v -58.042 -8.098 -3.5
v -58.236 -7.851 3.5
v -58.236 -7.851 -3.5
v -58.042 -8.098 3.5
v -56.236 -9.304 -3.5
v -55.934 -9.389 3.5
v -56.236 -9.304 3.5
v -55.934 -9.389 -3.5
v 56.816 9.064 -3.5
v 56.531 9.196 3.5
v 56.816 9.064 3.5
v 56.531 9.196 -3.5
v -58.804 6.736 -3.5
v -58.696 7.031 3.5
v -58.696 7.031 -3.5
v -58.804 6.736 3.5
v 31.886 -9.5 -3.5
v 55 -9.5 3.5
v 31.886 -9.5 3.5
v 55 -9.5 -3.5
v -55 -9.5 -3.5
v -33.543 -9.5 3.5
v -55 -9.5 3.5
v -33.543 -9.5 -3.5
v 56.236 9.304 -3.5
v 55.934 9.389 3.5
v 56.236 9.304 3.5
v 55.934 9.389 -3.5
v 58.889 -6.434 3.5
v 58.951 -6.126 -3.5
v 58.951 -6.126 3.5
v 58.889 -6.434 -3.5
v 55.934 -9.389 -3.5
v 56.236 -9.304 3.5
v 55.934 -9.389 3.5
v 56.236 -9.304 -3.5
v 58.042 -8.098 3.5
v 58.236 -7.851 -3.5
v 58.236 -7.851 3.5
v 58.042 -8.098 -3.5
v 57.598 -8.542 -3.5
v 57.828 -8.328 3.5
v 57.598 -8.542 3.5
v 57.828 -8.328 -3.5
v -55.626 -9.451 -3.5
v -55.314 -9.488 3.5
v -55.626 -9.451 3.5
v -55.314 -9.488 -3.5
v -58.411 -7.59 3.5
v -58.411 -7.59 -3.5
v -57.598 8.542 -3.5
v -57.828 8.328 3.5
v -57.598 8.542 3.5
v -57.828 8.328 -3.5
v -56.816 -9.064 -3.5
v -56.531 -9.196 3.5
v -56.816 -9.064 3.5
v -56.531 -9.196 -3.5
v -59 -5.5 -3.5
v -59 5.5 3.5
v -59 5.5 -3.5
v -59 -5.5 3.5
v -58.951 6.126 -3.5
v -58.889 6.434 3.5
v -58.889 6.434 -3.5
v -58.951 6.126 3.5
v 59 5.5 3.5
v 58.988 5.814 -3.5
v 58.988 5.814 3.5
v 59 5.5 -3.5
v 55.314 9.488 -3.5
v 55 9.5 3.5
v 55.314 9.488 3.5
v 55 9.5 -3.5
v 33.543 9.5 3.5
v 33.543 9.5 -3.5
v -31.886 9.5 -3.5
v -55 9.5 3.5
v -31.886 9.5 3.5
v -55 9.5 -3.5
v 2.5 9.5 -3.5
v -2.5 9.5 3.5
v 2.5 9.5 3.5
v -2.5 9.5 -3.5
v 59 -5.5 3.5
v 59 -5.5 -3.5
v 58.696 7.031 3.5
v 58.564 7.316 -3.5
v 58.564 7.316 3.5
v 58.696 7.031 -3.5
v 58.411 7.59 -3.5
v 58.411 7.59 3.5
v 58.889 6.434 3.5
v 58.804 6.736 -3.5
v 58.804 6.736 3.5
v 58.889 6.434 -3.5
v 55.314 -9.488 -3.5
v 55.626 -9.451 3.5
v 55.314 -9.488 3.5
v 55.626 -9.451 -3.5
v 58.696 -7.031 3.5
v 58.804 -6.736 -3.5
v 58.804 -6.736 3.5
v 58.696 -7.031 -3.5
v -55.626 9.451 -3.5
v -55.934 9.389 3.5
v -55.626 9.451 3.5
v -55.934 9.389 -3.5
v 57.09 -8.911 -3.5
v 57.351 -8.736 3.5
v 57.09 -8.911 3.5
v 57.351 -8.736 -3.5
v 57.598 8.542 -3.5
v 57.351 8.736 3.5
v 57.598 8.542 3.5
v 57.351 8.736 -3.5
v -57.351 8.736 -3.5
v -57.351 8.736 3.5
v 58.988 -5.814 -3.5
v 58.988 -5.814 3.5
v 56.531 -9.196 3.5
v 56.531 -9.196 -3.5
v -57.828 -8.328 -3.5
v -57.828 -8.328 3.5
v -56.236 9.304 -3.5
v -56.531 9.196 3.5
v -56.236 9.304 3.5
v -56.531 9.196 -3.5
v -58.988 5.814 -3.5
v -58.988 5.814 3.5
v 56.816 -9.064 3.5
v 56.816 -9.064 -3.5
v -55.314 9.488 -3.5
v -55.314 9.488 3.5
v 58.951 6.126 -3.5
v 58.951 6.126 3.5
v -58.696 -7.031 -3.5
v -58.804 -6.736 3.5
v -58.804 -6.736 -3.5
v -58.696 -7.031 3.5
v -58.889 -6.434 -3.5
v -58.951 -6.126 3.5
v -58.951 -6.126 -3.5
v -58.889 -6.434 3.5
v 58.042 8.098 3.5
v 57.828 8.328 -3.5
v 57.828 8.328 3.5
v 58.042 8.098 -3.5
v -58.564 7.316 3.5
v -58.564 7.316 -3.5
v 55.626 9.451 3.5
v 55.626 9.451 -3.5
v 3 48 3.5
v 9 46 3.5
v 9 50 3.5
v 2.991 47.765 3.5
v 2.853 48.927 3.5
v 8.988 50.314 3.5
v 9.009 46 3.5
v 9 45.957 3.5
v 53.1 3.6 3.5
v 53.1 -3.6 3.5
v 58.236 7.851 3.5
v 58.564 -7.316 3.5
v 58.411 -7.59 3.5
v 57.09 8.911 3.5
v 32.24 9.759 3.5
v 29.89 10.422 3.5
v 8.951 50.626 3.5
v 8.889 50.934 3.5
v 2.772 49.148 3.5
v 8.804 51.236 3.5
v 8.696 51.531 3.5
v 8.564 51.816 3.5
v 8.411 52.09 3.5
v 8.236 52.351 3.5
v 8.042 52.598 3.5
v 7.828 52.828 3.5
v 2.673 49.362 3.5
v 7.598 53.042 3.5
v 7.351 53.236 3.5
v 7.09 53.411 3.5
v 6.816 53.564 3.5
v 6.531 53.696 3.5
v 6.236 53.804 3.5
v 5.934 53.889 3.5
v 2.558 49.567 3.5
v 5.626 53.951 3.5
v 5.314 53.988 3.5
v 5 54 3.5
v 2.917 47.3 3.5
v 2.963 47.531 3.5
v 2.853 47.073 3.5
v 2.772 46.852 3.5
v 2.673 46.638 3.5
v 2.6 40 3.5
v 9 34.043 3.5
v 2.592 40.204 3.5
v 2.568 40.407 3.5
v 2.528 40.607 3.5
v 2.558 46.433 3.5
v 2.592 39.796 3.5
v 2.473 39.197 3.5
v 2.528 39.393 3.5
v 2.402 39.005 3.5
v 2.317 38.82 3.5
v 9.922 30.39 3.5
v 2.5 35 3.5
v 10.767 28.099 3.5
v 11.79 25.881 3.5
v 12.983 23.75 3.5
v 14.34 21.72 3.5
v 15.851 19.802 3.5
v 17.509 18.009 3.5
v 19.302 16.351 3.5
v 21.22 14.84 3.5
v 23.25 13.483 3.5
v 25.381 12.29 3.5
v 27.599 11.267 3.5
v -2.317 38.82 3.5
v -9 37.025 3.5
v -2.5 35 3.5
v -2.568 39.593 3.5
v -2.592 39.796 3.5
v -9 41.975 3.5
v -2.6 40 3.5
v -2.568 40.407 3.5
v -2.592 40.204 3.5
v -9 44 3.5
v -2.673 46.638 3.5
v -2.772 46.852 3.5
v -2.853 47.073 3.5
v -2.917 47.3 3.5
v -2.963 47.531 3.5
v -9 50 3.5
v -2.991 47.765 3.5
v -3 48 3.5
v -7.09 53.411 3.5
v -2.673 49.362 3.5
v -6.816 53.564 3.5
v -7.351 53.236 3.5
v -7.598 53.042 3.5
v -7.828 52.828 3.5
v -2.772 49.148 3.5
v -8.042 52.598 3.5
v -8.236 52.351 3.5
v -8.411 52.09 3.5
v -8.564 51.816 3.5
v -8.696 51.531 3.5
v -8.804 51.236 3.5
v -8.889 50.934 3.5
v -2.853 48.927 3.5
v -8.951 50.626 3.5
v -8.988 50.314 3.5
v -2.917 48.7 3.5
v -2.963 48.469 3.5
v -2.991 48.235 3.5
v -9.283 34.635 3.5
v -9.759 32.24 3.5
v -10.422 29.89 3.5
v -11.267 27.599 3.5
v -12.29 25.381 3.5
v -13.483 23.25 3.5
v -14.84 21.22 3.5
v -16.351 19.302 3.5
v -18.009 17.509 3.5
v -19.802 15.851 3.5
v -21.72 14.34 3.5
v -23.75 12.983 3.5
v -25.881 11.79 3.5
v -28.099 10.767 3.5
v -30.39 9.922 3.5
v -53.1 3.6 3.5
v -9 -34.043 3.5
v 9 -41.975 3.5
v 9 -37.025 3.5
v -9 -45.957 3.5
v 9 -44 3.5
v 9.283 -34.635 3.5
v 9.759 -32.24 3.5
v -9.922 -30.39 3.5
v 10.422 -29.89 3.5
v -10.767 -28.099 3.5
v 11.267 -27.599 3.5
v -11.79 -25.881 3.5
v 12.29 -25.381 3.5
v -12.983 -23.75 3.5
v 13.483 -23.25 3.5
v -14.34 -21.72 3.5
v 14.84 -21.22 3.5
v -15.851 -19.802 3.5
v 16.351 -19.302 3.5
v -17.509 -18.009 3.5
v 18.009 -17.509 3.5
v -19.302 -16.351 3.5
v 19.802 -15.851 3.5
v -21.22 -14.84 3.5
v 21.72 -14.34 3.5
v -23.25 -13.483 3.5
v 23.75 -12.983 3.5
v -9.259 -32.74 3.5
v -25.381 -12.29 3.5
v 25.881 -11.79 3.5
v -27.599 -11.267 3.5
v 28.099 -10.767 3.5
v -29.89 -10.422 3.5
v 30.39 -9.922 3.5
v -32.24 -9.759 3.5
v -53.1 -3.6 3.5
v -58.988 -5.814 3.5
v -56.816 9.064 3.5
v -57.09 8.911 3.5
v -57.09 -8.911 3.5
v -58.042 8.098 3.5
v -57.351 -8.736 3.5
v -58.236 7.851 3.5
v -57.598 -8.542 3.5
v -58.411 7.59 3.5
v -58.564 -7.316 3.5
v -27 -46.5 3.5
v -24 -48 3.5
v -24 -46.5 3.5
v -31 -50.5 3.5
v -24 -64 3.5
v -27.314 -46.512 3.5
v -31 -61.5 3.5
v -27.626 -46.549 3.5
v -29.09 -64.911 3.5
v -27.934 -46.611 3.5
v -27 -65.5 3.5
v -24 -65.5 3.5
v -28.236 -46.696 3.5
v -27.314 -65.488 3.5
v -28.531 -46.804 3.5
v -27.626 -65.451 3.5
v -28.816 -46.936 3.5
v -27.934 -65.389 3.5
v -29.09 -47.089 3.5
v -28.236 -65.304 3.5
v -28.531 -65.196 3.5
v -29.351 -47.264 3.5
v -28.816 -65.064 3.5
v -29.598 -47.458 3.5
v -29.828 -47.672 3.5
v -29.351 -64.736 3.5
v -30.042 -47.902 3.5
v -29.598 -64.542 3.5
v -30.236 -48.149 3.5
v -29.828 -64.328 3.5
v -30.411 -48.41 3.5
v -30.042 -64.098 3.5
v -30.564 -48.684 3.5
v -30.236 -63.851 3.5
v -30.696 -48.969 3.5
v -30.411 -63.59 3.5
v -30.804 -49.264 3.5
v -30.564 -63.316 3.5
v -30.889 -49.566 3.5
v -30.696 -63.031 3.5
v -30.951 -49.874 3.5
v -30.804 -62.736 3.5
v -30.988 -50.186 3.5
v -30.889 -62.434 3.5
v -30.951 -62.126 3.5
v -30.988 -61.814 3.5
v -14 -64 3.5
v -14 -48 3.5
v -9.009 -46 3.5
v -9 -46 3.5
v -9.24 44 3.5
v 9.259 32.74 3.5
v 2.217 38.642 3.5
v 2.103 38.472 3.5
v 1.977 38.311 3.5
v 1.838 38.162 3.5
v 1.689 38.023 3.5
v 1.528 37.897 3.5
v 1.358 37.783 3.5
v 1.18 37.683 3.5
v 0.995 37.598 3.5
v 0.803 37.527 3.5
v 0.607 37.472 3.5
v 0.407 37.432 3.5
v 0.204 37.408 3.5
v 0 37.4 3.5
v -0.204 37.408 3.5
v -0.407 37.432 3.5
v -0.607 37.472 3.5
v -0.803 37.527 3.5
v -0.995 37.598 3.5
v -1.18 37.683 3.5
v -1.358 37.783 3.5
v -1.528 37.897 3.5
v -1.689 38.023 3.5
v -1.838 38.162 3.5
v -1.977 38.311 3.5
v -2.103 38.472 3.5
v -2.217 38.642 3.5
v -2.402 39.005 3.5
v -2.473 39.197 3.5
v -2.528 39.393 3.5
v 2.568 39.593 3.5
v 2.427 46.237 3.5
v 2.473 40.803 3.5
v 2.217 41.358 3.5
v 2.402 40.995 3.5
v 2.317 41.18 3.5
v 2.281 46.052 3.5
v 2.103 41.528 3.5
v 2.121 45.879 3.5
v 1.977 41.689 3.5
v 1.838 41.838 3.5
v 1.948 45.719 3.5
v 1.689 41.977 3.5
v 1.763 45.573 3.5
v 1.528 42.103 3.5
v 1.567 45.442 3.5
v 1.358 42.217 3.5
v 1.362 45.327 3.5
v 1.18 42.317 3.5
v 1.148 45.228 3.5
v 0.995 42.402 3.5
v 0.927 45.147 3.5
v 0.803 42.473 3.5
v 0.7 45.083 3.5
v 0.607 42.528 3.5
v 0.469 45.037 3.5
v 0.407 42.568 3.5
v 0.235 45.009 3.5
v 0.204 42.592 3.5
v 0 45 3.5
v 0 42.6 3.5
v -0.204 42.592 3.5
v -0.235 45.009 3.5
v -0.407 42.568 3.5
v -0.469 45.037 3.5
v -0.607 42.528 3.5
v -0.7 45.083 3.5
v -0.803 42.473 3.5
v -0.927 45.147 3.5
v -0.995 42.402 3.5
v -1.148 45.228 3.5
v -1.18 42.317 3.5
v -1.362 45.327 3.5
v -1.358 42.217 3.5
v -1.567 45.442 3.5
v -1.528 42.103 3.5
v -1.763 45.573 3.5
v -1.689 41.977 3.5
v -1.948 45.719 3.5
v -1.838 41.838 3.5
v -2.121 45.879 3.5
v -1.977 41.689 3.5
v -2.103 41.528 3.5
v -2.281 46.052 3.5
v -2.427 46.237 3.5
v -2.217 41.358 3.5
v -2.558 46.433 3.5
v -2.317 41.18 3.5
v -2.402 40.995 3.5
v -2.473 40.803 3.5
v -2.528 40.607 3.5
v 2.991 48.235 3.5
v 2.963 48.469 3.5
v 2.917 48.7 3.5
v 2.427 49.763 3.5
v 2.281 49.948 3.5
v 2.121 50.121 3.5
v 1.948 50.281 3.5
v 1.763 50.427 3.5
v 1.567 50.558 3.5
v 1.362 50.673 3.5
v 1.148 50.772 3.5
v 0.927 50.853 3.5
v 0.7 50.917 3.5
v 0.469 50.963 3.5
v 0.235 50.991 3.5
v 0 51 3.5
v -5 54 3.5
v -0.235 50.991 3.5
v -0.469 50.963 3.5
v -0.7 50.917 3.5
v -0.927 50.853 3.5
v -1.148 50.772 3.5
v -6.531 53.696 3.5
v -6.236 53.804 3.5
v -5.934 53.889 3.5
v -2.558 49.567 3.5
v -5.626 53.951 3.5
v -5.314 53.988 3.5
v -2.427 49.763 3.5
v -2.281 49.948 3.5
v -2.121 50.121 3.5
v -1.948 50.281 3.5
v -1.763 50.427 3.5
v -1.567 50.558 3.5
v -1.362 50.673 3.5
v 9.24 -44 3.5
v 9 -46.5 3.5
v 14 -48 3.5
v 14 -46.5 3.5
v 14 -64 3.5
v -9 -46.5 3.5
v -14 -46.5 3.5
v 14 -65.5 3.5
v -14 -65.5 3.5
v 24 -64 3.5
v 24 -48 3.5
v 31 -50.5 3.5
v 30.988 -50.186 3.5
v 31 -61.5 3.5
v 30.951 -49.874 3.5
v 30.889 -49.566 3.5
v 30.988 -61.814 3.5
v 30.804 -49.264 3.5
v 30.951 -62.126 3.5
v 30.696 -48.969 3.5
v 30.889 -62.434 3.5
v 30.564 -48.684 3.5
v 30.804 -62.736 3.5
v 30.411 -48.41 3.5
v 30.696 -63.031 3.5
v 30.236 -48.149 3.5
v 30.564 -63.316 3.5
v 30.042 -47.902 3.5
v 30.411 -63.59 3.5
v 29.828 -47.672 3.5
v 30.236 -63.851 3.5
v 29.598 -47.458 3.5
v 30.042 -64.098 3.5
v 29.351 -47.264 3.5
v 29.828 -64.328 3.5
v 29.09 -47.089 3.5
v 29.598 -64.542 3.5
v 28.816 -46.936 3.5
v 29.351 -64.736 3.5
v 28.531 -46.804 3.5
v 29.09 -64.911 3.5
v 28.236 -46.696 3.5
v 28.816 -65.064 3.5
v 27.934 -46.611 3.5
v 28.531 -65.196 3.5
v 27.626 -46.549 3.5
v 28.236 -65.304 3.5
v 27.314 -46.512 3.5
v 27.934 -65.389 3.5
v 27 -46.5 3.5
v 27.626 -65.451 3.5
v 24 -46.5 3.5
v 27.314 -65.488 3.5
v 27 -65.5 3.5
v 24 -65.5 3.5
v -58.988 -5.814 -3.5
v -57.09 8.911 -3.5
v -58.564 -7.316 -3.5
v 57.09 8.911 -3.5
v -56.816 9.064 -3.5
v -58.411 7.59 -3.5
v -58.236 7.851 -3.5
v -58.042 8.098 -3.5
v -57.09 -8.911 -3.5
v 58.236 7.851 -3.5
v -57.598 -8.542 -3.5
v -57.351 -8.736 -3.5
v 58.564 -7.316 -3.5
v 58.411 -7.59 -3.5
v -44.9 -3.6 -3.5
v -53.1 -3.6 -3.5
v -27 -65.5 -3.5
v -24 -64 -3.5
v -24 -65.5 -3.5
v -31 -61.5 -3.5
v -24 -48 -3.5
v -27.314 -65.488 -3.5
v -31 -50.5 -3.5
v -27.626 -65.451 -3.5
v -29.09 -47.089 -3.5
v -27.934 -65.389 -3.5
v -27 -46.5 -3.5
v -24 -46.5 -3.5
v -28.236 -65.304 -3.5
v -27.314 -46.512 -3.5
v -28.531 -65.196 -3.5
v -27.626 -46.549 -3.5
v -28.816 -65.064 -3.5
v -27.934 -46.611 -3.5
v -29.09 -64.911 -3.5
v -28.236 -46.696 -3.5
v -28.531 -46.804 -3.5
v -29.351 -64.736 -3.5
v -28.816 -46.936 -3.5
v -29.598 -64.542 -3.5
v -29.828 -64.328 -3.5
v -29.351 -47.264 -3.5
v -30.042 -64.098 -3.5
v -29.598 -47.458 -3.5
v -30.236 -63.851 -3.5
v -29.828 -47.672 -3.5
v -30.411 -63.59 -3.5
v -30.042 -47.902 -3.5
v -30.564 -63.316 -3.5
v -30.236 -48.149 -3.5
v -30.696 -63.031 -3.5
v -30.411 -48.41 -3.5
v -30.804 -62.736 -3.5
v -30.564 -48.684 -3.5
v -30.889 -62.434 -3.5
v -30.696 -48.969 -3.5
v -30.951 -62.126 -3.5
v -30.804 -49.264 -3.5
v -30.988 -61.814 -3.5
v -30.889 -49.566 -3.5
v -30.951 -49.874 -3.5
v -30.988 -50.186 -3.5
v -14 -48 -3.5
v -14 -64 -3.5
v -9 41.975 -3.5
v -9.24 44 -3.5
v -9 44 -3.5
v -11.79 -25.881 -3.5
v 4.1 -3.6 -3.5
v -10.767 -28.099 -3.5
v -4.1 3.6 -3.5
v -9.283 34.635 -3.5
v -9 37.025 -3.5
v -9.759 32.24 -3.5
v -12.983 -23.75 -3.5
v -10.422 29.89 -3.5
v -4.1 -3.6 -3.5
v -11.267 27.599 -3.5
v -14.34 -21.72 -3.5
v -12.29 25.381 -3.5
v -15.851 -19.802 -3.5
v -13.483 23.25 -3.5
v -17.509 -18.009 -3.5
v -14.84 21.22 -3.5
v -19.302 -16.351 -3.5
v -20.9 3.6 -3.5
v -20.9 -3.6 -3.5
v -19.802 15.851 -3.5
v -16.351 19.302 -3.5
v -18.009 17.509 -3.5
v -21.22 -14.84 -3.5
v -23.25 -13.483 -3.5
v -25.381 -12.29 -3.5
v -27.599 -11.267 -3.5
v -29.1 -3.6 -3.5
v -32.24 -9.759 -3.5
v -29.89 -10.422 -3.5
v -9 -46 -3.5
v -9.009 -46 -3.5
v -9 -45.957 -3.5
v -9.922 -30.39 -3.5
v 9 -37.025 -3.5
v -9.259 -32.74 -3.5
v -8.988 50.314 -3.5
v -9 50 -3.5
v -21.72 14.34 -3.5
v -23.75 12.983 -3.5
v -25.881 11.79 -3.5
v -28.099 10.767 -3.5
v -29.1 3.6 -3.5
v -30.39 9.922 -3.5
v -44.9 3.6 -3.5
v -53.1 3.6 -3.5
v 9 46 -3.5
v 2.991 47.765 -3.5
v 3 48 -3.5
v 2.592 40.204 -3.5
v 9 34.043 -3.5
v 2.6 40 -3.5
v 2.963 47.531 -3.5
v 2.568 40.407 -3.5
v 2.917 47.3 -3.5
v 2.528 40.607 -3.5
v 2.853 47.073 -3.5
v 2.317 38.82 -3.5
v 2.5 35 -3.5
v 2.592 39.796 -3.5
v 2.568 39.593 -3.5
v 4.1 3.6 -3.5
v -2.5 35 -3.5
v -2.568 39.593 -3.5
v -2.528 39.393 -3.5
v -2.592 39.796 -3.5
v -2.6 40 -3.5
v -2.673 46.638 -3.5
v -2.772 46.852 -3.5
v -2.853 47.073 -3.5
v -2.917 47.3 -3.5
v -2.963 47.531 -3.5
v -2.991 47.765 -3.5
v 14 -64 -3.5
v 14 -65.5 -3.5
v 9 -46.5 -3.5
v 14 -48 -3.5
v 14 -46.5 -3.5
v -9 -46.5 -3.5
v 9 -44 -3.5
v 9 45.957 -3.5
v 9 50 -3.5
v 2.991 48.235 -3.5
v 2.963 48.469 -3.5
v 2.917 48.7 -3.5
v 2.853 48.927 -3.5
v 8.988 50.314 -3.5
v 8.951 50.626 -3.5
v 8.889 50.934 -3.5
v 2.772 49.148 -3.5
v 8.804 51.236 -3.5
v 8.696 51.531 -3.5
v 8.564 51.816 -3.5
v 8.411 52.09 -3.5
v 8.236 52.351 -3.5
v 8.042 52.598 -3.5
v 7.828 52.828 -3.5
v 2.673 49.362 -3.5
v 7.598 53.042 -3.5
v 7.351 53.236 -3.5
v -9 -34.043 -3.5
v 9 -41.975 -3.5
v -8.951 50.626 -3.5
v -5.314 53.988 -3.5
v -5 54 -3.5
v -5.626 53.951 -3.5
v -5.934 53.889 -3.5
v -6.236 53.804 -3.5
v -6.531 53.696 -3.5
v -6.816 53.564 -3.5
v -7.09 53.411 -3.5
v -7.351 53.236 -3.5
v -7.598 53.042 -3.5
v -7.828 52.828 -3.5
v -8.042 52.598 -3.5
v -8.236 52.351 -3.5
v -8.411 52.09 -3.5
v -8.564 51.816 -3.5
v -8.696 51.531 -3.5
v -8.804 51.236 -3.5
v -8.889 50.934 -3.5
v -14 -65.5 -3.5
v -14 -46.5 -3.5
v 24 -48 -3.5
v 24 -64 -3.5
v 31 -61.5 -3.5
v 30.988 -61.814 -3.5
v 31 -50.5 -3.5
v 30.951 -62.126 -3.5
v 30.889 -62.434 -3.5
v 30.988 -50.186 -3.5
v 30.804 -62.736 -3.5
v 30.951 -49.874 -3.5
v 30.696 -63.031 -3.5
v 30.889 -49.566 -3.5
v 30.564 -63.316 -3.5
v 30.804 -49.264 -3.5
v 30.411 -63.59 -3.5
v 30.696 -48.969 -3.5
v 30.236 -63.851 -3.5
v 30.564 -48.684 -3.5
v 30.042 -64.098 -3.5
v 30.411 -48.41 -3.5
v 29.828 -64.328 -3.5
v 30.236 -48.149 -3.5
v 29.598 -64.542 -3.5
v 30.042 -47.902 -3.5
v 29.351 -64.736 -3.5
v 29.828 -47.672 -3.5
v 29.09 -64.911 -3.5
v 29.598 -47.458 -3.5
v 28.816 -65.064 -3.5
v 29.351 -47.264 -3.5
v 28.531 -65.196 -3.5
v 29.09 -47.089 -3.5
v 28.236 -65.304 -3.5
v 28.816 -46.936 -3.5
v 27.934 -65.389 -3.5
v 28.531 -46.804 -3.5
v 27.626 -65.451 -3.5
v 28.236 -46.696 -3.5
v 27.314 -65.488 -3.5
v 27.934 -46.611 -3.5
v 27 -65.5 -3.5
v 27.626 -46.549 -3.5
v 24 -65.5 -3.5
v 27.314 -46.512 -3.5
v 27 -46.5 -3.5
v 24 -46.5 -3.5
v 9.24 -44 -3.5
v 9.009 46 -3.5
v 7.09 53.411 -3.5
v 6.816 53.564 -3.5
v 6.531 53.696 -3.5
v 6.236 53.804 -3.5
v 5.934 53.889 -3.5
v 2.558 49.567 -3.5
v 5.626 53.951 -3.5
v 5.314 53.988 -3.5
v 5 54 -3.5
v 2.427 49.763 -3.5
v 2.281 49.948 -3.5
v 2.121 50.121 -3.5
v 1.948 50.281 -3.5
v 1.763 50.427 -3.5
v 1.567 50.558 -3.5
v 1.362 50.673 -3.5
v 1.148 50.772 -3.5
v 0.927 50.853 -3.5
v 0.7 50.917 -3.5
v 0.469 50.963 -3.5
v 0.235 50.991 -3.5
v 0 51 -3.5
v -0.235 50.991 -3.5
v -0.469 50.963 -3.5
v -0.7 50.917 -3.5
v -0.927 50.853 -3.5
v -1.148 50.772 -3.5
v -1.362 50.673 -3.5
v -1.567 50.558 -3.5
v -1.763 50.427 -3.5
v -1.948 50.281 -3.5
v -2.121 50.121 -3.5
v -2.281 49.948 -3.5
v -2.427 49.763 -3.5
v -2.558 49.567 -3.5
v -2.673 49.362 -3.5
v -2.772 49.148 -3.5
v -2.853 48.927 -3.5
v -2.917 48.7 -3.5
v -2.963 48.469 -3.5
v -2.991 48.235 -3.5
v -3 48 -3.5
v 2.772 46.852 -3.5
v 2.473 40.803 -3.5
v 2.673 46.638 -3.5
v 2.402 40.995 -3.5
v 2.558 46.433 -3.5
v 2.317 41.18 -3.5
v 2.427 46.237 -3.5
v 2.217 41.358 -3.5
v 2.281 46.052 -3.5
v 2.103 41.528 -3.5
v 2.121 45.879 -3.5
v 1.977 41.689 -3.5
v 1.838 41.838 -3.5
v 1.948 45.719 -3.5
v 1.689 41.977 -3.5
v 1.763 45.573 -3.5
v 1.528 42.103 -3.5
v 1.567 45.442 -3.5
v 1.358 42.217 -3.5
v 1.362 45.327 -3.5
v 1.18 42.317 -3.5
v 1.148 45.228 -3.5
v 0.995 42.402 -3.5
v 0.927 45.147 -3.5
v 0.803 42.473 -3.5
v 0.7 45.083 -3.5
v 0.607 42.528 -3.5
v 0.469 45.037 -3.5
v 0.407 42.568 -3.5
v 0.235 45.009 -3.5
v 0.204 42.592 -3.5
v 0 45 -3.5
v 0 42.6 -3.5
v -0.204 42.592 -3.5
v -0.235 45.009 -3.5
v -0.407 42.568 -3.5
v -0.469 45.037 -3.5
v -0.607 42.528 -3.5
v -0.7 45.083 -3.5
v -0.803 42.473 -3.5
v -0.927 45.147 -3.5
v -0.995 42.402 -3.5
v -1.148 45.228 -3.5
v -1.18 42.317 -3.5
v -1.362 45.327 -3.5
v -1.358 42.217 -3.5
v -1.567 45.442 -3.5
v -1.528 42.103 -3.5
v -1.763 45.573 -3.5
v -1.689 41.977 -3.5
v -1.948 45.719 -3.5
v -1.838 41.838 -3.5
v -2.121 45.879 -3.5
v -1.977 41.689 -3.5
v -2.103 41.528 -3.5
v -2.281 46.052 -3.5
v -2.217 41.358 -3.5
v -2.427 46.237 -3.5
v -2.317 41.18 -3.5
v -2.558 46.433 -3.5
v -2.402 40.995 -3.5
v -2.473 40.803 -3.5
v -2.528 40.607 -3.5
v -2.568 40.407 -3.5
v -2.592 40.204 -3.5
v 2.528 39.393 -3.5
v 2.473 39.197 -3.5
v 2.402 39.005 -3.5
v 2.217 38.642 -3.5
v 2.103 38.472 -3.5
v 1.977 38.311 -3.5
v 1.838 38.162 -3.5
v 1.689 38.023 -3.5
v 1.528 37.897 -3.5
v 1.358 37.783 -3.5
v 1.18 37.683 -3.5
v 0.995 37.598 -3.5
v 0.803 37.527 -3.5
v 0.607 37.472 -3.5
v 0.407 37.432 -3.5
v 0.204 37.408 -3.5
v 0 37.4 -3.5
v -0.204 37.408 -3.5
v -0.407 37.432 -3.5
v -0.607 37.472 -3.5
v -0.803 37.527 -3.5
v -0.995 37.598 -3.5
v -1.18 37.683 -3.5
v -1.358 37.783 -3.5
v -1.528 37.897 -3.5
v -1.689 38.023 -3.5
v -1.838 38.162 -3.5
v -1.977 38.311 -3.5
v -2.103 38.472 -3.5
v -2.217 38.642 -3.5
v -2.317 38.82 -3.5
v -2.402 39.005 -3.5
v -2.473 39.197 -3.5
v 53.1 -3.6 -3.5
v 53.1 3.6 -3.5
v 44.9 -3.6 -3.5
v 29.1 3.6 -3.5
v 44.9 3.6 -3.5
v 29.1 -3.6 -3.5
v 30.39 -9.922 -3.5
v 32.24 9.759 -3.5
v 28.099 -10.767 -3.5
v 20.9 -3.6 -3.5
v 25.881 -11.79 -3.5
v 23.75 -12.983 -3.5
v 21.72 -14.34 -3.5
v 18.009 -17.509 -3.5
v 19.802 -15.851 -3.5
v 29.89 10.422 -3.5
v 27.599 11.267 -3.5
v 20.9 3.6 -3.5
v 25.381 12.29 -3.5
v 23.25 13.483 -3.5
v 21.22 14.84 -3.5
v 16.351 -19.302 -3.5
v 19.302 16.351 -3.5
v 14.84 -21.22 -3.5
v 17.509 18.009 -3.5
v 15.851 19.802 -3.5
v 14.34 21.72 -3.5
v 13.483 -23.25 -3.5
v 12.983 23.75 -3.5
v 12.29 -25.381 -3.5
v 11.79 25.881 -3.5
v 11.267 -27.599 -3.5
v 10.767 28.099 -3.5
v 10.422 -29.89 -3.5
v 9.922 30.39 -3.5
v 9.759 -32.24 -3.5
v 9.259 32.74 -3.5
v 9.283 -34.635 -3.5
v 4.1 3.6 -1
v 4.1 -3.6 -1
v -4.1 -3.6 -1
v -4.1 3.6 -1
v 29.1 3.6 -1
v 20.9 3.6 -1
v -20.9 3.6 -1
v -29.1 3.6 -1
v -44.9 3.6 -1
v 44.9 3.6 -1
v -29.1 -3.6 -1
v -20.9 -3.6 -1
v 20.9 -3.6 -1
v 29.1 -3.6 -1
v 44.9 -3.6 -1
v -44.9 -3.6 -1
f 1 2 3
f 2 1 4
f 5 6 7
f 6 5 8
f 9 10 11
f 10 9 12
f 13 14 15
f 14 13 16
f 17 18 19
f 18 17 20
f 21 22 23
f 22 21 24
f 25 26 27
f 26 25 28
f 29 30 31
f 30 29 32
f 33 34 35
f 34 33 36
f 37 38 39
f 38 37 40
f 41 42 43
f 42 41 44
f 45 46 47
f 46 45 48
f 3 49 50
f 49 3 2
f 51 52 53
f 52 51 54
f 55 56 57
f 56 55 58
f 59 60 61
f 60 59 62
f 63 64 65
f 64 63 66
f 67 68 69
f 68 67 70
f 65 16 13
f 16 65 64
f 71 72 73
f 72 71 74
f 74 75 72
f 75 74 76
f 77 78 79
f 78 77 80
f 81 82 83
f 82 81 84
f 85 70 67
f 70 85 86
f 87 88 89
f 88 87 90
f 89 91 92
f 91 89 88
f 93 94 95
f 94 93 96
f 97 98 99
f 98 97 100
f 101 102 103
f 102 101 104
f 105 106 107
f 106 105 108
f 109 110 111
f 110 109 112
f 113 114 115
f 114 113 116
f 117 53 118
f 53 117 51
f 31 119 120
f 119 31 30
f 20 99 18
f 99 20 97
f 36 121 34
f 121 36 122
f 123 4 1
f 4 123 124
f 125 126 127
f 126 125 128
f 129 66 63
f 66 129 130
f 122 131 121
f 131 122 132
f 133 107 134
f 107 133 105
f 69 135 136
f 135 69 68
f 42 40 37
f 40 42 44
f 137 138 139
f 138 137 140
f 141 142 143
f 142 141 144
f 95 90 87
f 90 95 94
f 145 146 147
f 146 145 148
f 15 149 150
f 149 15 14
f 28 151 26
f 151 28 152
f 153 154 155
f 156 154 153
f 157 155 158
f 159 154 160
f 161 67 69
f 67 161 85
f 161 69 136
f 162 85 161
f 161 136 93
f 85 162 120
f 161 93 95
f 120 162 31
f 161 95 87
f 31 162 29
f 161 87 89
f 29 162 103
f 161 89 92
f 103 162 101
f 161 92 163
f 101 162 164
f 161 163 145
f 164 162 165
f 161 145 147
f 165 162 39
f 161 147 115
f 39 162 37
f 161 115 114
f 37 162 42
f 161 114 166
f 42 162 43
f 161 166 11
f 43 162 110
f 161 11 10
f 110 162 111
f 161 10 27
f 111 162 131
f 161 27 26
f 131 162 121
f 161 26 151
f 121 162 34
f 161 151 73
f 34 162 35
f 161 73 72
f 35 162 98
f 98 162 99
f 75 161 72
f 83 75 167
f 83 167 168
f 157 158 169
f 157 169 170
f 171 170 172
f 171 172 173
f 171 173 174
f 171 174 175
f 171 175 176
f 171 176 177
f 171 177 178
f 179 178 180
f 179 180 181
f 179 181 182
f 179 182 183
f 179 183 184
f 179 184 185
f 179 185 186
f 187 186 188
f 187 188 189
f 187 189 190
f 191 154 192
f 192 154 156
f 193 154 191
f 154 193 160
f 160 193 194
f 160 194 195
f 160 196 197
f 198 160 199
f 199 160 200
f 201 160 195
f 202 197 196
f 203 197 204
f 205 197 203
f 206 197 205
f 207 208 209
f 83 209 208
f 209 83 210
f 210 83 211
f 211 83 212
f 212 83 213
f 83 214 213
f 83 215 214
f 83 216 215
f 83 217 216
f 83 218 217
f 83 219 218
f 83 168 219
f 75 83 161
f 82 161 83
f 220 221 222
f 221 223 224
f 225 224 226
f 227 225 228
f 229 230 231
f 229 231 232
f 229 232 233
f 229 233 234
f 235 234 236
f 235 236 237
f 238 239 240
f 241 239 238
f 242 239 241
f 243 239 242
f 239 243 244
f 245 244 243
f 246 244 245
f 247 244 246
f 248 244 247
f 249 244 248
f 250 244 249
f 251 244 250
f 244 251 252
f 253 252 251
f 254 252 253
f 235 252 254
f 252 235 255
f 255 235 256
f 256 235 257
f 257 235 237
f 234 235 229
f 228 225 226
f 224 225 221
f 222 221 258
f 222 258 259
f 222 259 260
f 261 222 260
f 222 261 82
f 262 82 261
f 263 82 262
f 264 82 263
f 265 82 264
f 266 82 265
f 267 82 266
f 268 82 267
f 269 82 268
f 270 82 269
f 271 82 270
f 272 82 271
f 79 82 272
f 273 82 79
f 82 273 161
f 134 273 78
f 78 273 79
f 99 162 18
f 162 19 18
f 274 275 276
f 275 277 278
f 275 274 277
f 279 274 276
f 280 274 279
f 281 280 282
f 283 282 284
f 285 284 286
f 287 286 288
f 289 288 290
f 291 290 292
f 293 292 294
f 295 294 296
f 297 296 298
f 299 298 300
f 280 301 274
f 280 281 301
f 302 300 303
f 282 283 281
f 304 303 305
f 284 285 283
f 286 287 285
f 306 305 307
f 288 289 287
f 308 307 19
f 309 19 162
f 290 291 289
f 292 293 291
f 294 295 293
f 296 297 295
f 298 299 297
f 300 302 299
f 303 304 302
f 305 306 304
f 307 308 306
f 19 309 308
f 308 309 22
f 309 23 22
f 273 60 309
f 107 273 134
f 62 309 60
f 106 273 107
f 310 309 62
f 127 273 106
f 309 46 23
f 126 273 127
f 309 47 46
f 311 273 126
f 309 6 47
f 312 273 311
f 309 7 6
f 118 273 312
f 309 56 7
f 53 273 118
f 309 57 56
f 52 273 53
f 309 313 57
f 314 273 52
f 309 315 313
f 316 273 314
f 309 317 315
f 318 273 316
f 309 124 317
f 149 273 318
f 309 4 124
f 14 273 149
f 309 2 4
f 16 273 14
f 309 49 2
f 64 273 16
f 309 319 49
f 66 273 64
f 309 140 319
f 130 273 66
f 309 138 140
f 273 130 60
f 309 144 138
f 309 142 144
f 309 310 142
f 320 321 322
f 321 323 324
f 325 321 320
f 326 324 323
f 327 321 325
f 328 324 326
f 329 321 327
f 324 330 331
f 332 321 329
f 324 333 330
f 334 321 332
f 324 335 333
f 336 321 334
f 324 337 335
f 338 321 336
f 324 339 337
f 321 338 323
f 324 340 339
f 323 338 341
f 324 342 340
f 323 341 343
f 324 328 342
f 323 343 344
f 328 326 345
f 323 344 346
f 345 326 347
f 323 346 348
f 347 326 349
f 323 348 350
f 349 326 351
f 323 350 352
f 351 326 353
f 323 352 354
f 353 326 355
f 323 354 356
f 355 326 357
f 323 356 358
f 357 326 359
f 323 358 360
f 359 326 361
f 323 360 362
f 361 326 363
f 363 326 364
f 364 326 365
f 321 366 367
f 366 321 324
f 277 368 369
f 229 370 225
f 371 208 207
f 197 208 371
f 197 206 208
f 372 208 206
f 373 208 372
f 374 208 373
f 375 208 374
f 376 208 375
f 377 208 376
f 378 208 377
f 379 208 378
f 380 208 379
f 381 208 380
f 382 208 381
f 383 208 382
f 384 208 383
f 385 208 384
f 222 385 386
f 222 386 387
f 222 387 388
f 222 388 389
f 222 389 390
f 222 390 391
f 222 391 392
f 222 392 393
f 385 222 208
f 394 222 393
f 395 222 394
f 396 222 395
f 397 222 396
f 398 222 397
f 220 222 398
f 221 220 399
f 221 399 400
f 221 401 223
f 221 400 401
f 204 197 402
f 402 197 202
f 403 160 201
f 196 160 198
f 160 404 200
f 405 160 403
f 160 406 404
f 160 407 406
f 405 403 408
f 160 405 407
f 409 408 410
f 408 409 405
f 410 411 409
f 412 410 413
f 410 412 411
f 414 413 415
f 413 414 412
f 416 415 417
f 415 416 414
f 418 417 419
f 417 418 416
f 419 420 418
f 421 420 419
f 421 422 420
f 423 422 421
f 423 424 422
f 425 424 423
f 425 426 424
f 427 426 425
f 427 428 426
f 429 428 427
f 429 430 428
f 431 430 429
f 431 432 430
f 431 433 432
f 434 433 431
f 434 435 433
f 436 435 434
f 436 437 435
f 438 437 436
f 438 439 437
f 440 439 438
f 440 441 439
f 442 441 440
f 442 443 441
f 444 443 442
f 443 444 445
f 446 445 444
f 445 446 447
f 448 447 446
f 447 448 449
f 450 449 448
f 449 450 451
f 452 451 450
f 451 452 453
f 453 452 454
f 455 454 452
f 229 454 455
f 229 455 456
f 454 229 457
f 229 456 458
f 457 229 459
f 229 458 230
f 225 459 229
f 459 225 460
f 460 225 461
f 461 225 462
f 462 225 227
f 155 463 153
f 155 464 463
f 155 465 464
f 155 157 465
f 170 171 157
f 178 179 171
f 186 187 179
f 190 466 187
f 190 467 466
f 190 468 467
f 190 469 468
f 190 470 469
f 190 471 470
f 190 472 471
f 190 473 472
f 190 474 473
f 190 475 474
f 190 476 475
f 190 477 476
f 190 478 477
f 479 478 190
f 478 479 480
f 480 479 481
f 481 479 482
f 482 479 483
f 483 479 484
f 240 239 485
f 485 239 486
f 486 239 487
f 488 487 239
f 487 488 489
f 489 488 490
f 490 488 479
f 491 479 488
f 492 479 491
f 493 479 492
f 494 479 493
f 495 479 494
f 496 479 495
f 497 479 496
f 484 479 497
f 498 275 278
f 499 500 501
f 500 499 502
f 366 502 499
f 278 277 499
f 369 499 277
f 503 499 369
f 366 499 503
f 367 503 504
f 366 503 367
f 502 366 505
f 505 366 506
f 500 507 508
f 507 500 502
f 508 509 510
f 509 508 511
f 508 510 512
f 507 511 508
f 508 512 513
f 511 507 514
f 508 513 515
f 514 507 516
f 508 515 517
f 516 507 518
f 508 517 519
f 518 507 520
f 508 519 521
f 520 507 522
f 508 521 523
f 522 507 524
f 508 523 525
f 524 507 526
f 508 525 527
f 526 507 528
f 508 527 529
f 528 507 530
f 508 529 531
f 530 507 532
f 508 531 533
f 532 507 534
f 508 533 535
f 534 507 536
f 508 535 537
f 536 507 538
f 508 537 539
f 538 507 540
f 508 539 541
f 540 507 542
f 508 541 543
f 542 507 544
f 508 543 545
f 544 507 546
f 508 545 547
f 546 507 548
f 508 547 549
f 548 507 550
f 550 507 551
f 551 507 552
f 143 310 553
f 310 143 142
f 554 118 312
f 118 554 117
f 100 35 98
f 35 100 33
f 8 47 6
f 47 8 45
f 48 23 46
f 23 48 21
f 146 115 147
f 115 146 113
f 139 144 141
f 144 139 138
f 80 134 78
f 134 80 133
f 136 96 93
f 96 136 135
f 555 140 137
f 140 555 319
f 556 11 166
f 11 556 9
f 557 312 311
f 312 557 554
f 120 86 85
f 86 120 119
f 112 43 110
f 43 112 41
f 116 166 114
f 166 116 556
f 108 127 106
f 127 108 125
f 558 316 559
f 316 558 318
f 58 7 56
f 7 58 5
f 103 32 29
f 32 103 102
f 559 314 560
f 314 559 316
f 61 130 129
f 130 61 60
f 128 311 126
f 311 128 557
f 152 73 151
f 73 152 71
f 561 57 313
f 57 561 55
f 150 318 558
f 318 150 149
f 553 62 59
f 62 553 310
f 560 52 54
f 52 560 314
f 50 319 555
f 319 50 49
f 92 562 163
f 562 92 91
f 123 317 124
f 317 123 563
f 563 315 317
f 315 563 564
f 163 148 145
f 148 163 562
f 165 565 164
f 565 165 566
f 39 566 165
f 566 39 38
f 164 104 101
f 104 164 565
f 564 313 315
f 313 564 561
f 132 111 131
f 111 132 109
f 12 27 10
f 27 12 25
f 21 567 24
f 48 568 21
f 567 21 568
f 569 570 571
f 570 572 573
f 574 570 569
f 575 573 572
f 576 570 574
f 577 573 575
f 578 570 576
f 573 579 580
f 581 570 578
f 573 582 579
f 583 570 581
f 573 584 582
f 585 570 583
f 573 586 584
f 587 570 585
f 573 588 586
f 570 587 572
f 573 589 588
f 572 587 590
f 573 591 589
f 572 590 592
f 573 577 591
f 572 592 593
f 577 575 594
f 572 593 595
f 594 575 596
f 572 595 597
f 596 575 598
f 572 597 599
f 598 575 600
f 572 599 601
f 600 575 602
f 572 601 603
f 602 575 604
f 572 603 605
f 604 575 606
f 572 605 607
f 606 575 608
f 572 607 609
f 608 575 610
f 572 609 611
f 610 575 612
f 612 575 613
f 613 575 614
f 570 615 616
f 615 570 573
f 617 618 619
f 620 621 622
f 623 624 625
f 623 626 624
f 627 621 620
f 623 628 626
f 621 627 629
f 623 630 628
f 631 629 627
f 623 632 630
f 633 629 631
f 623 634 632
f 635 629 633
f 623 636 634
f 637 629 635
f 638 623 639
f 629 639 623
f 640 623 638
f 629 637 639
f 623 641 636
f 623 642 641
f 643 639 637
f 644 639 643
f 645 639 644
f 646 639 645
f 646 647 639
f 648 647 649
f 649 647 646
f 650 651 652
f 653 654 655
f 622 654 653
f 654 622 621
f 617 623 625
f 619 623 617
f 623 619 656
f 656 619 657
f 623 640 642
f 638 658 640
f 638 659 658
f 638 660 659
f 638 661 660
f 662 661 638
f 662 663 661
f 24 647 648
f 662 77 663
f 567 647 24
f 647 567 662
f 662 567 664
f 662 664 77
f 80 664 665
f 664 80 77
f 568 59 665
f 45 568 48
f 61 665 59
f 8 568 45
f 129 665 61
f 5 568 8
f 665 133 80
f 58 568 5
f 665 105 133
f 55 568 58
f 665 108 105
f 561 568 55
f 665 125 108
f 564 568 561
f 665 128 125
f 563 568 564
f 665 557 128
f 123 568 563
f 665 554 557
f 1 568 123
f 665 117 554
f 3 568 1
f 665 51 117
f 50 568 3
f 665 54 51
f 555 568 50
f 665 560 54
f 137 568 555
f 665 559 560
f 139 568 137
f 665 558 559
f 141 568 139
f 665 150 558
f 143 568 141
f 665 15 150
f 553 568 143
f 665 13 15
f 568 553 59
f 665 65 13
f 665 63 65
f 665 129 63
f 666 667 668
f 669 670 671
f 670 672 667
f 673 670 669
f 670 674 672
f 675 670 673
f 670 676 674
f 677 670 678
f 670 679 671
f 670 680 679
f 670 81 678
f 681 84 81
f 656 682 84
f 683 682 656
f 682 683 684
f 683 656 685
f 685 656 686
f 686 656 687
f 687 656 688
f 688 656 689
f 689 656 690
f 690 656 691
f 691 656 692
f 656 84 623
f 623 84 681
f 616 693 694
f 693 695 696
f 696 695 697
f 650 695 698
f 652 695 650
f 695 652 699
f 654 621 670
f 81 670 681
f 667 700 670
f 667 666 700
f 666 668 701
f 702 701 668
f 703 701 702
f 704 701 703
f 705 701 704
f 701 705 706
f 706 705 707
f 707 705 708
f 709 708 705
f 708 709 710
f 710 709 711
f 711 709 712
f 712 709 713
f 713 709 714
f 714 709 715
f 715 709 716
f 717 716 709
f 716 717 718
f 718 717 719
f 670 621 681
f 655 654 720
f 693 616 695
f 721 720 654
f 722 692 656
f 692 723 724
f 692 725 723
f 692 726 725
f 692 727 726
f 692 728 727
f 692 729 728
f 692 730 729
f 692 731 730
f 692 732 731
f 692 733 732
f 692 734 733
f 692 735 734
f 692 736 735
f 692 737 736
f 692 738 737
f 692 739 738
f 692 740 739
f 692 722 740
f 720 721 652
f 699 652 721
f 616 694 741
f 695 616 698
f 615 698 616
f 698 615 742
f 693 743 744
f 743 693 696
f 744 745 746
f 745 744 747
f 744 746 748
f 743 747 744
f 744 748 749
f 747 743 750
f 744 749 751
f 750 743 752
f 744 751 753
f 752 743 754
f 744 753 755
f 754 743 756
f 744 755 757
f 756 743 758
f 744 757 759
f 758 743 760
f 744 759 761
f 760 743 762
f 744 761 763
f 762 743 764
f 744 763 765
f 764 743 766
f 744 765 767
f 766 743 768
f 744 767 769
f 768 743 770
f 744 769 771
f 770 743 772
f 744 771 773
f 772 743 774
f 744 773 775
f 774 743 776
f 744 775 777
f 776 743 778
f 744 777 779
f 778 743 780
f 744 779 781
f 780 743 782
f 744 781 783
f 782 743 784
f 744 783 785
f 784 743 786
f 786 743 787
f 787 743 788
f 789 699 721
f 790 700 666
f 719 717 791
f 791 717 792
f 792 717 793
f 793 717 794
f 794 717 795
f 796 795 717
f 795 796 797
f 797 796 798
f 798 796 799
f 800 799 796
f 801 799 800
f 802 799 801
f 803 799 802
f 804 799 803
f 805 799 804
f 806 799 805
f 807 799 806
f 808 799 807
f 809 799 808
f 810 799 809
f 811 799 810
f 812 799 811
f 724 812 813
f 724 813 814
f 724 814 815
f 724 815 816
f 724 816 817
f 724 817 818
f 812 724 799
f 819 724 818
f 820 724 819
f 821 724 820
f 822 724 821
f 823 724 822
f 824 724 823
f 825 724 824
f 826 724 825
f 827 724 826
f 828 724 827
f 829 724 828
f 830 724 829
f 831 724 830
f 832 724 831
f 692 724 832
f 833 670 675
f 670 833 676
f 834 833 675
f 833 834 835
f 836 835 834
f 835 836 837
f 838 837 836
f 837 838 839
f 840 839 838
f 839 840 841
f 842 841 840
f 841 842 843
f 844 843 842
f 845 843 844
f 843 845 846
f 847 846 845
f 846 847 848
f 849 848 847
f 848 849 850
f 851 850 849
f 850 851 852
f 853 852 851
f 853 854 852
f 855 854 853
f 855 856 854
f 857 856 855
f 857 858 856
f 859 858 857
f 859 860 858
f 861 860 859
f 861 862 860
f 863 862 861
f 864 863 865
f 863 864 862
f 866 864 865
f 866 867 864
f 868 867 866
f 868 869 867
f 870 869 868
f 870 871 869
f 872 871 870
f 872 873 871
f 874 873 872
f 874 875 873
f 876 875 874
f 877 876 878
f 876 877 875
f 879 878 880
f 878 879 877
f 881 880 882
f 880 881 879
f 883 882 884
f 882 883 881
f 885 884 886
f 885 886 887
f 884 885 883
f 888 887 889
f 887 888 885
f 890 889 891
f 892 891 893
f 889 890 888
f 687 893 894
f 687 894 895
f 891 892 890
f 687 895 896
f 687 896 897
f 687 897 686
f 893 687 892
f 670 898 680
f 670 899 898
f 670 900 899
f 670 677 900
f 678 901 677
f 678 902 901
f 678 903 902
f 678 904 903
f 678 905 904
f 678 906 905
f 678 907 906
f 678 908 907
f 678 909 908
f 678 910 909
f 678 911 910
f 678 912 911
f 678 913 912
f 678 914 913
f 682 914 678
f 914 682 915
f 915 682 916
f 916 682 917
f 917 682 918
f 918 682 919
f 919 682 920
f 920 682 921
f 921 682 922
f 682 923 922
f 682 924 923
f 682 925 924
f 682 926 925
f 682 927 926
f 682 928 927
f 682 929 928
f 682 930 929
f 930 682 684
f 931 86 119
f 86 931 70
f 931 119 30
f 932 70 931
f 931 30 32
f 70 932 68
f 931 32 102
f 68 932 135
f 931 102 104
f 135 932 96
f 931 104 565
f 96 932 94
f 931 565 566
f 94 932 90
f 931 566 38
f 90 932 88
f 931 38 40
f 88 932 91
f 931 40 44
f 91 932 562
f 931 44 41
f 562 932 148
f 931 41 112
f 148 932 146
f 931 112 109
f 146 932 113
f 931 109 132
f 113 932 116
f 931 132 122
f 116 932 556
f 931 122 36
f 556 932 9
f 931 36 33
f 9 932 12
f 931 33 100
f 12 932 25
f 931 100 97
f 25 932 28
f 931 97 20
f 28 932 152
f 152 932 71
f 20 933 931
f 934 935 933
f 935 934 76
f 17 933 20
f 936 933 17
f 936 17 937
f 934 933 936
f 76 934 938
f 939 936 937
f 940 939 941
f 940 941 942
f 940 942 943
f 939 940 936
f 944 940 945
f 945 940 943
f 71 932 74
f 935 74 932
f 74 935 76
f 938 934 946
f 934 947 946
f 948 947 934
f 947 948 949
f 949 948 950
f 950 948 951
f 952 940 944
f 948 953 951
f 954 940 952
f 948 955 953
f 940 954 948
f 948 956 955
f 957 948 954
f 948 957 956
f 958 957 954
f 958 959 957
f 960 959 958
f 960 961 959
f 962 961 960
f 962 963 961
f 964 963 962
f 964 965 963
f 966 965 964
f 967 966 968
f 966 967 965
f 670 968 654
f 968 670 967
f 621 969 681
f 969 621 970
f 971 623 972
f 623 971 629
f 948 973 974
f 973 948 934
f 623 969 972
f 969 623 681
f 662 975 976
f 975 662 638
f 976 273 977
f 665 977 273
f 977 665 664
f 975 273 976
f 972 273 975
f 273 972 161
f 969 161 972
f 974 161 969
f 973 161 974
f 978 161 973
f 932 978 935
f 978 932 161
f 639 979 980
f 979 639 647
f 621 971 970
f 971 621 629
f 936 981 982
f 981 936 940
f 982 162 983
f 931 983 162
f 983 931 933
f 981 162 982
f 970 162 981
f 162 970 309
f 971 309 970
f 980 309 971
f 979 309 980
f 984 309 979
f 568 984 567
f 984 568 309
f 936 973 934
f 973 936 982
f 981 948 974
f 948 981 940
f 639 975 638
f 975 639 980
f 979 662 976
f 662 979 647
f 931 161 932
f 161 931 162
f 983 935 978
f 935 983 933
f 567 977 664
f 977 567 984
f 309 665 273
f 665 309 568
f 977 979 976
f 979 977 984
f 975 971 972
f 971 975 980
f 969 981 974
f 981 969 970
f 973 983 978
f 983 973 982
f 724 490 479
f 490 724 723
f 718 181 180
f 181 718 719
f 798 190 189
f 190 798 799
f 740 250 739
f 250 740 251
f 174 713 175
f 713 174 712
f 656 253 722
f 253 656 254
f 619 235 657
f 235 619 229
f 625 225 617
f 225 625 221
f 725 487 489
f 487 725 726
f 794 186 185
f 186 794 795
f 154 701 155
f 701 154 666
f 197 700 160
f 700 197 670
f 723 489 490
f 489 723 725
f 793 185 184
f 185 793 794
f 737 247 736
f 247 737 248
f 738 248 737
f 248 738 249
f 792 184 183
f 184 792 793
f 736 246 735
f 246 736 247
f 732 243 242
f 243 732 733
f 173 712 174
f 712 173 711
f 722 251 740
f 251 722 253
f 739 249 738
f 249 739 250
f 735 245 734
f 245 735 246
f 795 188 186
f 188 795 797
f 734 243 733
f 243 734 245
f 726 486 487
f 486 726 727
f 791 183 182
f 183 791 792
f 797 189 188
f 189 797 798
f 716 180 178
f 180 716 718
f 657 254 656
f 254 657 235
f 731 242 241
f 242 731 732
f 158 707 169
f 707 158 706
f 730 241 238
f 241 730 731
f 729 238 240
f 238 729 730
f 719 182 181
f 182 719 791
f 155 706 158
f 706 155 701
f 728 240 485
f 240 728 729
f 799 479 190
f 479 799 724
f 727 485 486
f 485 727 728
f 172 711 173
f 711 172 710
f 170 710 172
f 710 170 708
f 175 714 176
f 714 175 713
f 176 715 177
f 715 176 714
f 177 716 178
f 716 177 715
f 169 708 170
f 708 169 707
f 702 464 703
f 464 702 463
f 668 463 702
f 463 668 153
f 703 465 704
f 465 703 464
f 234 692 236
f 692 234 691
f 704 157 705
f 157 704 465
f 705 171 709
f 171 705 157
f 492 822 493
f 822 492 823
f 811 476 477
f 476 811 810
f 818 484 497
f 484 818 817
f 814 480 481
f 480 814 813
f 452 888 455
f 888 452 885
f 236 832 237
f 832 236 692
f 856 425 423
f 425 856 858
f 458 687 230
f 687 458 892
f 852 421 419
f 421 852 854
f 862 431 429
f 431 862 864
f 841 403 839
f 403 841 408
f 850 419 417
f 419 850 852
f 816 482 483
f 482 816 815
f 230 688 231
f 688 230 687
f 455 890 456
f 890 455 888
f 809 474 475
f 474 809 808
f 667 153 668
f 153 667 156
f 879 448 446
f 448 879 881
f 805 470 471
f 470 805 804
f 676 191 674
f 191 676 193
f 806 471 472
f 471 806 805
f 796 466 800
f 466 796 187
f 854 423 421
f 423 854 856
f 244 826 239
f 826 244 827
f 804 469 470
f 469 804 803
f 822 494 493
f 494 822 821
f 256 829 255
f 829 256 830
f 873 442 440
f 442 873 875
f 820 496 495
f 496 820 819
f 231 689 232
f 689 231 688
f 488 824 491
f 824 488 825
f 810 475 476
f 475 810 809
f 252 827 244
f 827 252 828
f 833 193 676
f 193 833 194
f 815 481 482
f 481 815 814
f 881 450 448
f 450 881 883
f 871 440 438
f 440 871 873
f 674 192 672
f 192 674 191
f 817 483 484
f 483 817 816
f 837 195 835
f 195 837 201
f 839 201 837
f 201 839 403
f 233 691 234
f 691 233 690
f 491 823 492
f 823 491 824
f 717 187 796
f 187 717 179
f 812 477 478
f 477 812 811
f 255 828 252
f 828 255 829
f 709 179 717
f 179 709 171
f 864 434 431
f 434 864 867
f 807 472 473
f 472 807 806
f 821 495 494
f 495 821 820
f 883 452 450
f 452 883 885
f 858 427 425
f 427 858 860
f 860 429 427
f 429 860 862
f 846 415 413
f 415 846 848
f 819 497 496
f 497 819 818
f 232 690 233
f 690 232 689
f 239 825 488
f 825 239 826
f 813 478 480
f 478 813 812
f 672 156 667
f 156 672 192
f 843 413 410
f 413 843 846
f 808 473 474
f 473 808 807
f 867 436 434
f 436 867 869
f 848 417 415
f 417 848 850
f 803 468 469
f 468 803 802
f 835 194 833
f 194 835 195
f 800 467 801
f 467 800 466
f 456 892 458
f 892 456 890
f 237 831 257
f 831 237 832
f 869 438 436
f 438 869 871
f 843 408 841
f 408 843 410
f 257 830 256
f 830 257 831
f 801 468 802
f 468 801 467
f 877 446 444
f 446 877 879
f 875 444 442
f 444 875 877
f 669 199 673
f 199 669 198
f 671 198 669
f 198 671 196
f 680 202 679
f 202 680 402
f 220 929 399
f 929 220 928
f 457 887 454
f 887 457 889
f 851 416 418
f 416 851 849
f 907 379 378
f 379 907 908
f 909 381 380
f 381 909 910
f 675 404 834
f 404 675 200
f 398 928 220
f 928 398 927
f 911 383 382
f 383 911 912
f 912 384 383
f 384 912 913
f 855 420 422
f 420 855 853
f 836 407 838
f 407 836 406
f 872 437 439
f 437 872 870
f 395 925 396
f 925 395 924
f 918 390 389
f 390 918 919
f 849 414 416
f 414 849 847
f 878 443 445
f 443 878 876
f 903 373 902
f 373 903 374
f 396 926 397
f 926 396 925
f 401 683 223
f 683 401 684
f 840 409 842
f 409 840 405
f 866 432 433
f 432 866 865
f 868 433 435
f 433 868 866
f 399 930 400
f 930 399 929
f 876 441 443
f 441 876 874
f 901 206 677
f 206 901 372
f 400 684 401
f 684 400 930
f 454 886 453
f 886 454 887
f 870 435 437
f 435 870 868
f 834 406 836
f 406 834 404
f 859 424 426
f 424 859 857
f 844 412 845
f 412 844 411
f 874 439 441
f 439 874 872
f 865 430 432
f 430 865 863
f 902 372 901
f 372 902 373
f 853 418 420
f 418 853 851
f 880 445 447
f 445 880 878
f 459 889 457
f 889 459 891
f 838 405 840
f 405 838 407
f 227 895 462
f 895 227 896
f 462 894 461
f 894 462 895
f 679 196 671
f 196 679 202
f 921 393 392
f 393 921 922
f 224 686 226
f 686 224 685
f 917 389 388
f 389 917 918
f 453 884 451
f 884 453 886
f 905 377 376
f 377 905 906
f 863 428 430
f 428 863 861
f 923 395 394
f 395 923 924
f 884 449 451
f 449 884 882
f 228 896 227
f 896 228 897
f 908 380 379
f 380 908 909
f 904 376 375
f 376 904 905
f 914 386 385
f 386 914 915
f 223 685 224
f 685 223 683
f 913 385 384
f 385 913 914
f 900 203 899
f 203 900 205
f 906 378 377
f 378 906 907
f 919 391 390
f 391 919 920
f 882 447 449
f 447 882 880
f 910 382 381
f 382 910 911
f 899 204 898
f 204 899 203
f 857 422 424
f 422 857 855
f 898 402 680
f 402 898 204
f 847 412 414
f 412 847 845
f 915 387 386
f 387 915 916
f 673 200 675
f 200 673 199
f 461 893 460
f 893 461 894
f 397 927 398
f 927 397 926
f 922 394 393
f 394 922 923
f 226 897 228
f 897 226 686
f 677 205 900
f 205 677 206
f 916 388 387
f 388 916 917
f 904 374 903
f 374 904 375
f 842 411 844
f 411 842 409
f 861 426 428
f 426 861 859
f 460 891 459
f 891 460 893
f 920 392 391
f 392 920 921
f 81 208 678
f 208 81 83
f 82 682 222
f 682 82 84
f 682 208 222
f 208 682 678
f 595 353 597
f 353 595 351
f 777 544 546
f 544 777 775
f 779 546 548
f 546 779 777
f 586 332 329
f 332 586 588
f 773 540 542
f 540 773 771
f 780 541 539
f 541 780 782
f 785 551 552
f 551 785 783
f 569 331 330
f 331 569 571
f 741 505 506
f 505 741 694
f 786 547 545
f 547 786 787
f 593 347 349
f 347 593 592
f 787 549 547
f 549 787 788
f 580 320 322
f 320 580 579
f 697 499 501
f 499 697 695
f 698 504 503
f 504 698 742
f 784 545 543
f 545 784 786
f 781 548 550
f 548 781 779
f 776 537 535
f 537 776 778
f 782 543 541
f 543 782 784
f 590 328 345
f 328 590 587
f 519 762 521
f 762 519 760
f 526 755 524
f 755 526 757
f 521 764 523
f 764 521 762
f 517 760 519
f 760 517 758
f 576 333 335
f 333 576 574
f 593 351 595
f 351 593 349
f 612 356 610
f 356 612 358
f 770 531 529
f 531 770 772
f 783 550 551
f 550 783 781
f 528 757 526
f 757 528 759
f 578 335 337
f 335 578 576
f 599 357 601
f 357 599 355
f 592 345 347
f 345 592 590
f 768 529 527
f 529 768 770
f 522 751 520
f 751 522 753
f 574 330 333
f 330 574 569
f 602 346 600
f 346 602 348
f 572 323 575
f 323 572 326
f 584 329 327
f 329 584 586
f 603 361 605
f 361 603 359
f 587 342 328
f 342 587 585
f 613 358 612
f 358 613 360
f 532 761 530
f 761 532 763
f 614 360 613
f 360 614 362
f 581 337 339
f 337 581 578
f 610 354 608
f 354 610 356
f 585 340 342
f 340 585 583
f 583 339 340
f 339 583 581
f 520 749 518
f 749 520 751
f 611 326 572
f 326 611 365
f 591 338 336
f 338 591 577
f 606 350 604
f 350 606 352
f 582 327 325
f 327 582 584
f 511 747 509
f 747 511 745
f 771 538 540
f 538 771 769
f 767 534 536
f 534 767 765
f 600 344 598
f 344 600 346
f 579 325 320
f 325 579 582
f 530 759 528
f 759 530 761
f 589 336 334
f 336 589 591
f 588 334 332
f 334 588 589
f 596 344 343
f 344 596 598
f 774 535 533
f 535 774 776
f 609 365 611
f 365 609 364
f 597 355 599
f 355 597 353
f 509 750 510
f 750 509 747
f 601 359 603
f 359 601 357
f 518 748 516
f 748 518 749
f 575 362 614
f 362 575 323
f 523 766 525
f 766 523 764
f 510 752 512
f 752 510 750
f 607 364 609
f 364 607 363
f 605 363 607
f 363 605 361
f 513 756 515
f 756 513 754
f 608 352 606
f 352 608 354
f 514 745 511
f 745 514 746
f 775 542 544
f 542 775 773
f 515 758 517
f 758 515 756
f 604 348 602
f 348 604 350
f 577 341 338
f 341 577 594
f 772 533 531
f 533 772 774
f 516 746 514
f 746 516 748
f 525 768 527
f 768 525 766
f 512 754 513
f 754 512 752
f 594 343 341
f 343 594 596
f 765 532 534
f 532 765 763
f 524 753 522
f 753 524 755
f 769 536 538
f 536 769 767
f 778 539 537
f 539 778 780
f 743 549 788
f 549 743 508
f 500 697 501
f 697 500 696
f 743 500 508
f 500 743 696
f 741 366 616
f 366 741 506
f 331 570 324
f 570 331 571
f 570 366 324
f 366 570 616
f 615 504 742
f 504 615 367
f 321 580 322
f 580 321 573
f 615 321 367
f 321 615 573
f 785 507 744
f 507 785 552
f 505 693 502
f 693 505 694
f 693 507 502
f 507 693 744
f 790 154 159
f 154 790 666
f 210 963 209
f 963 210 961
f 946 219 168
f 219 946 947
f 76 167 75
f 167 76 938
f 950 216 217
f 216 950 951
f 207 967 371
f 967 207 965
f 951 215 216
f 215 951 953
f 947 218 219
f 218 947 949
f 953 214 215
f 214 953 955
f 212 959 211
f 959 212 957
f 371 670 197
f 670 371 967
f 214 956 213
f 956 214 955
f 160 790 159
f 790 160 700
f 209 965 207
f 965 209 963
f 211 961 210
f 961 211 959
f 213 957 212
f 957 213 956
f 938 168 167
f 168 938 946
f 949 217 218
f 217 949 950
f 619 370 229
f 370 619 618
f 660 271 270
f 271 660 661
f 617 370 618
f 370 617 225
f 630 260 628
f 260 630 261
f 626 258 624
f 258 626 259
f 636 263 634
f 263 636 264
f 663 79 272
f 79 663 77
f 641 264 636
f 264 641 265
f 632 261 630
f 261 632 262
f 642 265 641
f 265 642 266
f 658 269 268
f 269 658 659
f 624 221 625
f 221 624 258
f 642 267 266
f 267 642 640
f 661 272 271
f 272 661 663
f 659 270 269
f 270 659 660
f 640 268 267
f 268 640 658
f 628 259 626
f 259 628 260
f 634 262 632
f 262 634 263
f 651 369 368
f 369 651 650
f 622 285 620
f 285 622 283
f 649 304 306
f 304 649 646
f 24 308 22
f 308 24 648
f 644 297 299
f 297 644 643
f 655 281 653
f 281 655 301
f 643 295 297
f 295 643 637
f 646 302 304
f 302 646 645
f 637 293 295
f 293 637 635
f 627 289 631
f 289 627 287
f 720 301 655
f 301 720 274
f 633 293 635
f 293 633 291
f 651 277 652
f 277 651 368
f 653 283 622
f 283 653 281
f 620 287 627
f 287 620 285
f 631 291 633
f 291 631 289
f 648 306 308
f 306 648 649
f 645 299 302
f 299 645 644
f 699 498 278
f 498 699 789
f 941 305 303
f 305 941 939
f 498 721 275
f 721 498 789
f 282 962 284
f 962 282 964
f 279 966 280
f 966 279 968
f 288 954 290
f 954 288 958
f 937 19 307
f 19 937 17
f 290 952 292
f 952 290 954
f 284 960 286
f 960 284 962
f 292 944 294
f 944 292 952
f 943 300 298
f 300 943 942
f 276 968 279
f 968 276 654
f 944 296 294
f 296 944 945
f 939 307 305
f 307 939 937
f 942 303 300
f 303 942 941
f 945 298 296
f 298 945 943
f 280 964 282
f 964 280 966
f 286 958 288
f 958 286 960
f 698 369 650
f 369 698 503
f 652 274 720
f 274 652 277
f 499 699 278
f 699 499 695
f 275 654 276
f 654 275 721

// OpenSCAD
// Chassi Seguidor de Linha
//
// (c) 2014 Afonso Coutinho <afonso@yack.com.br>
//
// This program is free software: you can redistribute it and/or modify
// it under the terms of the GNU General Public License as published by
// the Free Software Foundation, either version 2 of the License, or
// (at your option) any later version.
//
// This program is distributed in the hope that it will be useful,
// but WITHOUT ANY WARRANTY; without even the implied warranty of
// MERCHANTABILITY or FITNESS FOR A PARTICULAR PURPOSE.  See the
// GNU General Public License for more details.
//
// You should have received a copy of the GNU General Public License
// along with this program.  If not, see <http://www.gnu.org/licenses/>.

$fn = 80;

difference(){
	minkowski(){
		cube([110,11,5], center=true);
		cylinder(r=4, h=2, center=true);
	}

	translate([0,0,-4])
	cube([8.2,7.2,16], center=true);

	translate([25,0,-4])
	cube([8.2,7.2,16], center=true);

	translate([-25,0,-4])
	cube([8.2,7.2,16], center=true);

	translate([49,0,-4])
	cube([8.2,7.2,16], center=true);

	translate([-49,0,-4])
	cube([8.2,7.2,16], center=true);

//Essa é a unica parte que não dá pra fazer com uma laser-cutter:
	translate([0,0,2])
	cube([100,7.2,6], center=true);
}

translate([0, 30]){
	difference(){
		minkowski(){
			cube([10,40,3], center=true);
			cylinder(r=4, h=4, center=true);
		}

		translate([0, 18])
		cylinder(r=3, h=10, center=true);

		translate([0, 10])
		cylinder(r=2.6, h=10, center=true);

		translate([0, -20])
		cube([5,50,10], center=true);
	}
}

translate([0,-34]){
	minkowski(){
		cube([10,49,3], center=true);
		cylinder(r=4, h=4, center=true);
	}
}

difference(){
	translate([0, -56]){
		minkowski(){
			cube([54,11,5], center = true);
			cylinder(r=4, h=2, center=true);
		}
	}

	translate([19, -43])
	cube([10,10,10], center=true);

	translate([-19, -69])
	cube([10,10,10], center=true);

	translate([-19, -43])
	cube([10,10,10], center=true);

	translate([19, -69])
	cube([10,10,10], center=true);
}

for (i=[0:3]){
	rotate(90*i){
		difference(){
			translate([24, 26])
			cube([40,40,7], center=true);

			translate([39.5, 40])
			cylinder(r=31.1, h=10, center=true);
		}
	}
}
